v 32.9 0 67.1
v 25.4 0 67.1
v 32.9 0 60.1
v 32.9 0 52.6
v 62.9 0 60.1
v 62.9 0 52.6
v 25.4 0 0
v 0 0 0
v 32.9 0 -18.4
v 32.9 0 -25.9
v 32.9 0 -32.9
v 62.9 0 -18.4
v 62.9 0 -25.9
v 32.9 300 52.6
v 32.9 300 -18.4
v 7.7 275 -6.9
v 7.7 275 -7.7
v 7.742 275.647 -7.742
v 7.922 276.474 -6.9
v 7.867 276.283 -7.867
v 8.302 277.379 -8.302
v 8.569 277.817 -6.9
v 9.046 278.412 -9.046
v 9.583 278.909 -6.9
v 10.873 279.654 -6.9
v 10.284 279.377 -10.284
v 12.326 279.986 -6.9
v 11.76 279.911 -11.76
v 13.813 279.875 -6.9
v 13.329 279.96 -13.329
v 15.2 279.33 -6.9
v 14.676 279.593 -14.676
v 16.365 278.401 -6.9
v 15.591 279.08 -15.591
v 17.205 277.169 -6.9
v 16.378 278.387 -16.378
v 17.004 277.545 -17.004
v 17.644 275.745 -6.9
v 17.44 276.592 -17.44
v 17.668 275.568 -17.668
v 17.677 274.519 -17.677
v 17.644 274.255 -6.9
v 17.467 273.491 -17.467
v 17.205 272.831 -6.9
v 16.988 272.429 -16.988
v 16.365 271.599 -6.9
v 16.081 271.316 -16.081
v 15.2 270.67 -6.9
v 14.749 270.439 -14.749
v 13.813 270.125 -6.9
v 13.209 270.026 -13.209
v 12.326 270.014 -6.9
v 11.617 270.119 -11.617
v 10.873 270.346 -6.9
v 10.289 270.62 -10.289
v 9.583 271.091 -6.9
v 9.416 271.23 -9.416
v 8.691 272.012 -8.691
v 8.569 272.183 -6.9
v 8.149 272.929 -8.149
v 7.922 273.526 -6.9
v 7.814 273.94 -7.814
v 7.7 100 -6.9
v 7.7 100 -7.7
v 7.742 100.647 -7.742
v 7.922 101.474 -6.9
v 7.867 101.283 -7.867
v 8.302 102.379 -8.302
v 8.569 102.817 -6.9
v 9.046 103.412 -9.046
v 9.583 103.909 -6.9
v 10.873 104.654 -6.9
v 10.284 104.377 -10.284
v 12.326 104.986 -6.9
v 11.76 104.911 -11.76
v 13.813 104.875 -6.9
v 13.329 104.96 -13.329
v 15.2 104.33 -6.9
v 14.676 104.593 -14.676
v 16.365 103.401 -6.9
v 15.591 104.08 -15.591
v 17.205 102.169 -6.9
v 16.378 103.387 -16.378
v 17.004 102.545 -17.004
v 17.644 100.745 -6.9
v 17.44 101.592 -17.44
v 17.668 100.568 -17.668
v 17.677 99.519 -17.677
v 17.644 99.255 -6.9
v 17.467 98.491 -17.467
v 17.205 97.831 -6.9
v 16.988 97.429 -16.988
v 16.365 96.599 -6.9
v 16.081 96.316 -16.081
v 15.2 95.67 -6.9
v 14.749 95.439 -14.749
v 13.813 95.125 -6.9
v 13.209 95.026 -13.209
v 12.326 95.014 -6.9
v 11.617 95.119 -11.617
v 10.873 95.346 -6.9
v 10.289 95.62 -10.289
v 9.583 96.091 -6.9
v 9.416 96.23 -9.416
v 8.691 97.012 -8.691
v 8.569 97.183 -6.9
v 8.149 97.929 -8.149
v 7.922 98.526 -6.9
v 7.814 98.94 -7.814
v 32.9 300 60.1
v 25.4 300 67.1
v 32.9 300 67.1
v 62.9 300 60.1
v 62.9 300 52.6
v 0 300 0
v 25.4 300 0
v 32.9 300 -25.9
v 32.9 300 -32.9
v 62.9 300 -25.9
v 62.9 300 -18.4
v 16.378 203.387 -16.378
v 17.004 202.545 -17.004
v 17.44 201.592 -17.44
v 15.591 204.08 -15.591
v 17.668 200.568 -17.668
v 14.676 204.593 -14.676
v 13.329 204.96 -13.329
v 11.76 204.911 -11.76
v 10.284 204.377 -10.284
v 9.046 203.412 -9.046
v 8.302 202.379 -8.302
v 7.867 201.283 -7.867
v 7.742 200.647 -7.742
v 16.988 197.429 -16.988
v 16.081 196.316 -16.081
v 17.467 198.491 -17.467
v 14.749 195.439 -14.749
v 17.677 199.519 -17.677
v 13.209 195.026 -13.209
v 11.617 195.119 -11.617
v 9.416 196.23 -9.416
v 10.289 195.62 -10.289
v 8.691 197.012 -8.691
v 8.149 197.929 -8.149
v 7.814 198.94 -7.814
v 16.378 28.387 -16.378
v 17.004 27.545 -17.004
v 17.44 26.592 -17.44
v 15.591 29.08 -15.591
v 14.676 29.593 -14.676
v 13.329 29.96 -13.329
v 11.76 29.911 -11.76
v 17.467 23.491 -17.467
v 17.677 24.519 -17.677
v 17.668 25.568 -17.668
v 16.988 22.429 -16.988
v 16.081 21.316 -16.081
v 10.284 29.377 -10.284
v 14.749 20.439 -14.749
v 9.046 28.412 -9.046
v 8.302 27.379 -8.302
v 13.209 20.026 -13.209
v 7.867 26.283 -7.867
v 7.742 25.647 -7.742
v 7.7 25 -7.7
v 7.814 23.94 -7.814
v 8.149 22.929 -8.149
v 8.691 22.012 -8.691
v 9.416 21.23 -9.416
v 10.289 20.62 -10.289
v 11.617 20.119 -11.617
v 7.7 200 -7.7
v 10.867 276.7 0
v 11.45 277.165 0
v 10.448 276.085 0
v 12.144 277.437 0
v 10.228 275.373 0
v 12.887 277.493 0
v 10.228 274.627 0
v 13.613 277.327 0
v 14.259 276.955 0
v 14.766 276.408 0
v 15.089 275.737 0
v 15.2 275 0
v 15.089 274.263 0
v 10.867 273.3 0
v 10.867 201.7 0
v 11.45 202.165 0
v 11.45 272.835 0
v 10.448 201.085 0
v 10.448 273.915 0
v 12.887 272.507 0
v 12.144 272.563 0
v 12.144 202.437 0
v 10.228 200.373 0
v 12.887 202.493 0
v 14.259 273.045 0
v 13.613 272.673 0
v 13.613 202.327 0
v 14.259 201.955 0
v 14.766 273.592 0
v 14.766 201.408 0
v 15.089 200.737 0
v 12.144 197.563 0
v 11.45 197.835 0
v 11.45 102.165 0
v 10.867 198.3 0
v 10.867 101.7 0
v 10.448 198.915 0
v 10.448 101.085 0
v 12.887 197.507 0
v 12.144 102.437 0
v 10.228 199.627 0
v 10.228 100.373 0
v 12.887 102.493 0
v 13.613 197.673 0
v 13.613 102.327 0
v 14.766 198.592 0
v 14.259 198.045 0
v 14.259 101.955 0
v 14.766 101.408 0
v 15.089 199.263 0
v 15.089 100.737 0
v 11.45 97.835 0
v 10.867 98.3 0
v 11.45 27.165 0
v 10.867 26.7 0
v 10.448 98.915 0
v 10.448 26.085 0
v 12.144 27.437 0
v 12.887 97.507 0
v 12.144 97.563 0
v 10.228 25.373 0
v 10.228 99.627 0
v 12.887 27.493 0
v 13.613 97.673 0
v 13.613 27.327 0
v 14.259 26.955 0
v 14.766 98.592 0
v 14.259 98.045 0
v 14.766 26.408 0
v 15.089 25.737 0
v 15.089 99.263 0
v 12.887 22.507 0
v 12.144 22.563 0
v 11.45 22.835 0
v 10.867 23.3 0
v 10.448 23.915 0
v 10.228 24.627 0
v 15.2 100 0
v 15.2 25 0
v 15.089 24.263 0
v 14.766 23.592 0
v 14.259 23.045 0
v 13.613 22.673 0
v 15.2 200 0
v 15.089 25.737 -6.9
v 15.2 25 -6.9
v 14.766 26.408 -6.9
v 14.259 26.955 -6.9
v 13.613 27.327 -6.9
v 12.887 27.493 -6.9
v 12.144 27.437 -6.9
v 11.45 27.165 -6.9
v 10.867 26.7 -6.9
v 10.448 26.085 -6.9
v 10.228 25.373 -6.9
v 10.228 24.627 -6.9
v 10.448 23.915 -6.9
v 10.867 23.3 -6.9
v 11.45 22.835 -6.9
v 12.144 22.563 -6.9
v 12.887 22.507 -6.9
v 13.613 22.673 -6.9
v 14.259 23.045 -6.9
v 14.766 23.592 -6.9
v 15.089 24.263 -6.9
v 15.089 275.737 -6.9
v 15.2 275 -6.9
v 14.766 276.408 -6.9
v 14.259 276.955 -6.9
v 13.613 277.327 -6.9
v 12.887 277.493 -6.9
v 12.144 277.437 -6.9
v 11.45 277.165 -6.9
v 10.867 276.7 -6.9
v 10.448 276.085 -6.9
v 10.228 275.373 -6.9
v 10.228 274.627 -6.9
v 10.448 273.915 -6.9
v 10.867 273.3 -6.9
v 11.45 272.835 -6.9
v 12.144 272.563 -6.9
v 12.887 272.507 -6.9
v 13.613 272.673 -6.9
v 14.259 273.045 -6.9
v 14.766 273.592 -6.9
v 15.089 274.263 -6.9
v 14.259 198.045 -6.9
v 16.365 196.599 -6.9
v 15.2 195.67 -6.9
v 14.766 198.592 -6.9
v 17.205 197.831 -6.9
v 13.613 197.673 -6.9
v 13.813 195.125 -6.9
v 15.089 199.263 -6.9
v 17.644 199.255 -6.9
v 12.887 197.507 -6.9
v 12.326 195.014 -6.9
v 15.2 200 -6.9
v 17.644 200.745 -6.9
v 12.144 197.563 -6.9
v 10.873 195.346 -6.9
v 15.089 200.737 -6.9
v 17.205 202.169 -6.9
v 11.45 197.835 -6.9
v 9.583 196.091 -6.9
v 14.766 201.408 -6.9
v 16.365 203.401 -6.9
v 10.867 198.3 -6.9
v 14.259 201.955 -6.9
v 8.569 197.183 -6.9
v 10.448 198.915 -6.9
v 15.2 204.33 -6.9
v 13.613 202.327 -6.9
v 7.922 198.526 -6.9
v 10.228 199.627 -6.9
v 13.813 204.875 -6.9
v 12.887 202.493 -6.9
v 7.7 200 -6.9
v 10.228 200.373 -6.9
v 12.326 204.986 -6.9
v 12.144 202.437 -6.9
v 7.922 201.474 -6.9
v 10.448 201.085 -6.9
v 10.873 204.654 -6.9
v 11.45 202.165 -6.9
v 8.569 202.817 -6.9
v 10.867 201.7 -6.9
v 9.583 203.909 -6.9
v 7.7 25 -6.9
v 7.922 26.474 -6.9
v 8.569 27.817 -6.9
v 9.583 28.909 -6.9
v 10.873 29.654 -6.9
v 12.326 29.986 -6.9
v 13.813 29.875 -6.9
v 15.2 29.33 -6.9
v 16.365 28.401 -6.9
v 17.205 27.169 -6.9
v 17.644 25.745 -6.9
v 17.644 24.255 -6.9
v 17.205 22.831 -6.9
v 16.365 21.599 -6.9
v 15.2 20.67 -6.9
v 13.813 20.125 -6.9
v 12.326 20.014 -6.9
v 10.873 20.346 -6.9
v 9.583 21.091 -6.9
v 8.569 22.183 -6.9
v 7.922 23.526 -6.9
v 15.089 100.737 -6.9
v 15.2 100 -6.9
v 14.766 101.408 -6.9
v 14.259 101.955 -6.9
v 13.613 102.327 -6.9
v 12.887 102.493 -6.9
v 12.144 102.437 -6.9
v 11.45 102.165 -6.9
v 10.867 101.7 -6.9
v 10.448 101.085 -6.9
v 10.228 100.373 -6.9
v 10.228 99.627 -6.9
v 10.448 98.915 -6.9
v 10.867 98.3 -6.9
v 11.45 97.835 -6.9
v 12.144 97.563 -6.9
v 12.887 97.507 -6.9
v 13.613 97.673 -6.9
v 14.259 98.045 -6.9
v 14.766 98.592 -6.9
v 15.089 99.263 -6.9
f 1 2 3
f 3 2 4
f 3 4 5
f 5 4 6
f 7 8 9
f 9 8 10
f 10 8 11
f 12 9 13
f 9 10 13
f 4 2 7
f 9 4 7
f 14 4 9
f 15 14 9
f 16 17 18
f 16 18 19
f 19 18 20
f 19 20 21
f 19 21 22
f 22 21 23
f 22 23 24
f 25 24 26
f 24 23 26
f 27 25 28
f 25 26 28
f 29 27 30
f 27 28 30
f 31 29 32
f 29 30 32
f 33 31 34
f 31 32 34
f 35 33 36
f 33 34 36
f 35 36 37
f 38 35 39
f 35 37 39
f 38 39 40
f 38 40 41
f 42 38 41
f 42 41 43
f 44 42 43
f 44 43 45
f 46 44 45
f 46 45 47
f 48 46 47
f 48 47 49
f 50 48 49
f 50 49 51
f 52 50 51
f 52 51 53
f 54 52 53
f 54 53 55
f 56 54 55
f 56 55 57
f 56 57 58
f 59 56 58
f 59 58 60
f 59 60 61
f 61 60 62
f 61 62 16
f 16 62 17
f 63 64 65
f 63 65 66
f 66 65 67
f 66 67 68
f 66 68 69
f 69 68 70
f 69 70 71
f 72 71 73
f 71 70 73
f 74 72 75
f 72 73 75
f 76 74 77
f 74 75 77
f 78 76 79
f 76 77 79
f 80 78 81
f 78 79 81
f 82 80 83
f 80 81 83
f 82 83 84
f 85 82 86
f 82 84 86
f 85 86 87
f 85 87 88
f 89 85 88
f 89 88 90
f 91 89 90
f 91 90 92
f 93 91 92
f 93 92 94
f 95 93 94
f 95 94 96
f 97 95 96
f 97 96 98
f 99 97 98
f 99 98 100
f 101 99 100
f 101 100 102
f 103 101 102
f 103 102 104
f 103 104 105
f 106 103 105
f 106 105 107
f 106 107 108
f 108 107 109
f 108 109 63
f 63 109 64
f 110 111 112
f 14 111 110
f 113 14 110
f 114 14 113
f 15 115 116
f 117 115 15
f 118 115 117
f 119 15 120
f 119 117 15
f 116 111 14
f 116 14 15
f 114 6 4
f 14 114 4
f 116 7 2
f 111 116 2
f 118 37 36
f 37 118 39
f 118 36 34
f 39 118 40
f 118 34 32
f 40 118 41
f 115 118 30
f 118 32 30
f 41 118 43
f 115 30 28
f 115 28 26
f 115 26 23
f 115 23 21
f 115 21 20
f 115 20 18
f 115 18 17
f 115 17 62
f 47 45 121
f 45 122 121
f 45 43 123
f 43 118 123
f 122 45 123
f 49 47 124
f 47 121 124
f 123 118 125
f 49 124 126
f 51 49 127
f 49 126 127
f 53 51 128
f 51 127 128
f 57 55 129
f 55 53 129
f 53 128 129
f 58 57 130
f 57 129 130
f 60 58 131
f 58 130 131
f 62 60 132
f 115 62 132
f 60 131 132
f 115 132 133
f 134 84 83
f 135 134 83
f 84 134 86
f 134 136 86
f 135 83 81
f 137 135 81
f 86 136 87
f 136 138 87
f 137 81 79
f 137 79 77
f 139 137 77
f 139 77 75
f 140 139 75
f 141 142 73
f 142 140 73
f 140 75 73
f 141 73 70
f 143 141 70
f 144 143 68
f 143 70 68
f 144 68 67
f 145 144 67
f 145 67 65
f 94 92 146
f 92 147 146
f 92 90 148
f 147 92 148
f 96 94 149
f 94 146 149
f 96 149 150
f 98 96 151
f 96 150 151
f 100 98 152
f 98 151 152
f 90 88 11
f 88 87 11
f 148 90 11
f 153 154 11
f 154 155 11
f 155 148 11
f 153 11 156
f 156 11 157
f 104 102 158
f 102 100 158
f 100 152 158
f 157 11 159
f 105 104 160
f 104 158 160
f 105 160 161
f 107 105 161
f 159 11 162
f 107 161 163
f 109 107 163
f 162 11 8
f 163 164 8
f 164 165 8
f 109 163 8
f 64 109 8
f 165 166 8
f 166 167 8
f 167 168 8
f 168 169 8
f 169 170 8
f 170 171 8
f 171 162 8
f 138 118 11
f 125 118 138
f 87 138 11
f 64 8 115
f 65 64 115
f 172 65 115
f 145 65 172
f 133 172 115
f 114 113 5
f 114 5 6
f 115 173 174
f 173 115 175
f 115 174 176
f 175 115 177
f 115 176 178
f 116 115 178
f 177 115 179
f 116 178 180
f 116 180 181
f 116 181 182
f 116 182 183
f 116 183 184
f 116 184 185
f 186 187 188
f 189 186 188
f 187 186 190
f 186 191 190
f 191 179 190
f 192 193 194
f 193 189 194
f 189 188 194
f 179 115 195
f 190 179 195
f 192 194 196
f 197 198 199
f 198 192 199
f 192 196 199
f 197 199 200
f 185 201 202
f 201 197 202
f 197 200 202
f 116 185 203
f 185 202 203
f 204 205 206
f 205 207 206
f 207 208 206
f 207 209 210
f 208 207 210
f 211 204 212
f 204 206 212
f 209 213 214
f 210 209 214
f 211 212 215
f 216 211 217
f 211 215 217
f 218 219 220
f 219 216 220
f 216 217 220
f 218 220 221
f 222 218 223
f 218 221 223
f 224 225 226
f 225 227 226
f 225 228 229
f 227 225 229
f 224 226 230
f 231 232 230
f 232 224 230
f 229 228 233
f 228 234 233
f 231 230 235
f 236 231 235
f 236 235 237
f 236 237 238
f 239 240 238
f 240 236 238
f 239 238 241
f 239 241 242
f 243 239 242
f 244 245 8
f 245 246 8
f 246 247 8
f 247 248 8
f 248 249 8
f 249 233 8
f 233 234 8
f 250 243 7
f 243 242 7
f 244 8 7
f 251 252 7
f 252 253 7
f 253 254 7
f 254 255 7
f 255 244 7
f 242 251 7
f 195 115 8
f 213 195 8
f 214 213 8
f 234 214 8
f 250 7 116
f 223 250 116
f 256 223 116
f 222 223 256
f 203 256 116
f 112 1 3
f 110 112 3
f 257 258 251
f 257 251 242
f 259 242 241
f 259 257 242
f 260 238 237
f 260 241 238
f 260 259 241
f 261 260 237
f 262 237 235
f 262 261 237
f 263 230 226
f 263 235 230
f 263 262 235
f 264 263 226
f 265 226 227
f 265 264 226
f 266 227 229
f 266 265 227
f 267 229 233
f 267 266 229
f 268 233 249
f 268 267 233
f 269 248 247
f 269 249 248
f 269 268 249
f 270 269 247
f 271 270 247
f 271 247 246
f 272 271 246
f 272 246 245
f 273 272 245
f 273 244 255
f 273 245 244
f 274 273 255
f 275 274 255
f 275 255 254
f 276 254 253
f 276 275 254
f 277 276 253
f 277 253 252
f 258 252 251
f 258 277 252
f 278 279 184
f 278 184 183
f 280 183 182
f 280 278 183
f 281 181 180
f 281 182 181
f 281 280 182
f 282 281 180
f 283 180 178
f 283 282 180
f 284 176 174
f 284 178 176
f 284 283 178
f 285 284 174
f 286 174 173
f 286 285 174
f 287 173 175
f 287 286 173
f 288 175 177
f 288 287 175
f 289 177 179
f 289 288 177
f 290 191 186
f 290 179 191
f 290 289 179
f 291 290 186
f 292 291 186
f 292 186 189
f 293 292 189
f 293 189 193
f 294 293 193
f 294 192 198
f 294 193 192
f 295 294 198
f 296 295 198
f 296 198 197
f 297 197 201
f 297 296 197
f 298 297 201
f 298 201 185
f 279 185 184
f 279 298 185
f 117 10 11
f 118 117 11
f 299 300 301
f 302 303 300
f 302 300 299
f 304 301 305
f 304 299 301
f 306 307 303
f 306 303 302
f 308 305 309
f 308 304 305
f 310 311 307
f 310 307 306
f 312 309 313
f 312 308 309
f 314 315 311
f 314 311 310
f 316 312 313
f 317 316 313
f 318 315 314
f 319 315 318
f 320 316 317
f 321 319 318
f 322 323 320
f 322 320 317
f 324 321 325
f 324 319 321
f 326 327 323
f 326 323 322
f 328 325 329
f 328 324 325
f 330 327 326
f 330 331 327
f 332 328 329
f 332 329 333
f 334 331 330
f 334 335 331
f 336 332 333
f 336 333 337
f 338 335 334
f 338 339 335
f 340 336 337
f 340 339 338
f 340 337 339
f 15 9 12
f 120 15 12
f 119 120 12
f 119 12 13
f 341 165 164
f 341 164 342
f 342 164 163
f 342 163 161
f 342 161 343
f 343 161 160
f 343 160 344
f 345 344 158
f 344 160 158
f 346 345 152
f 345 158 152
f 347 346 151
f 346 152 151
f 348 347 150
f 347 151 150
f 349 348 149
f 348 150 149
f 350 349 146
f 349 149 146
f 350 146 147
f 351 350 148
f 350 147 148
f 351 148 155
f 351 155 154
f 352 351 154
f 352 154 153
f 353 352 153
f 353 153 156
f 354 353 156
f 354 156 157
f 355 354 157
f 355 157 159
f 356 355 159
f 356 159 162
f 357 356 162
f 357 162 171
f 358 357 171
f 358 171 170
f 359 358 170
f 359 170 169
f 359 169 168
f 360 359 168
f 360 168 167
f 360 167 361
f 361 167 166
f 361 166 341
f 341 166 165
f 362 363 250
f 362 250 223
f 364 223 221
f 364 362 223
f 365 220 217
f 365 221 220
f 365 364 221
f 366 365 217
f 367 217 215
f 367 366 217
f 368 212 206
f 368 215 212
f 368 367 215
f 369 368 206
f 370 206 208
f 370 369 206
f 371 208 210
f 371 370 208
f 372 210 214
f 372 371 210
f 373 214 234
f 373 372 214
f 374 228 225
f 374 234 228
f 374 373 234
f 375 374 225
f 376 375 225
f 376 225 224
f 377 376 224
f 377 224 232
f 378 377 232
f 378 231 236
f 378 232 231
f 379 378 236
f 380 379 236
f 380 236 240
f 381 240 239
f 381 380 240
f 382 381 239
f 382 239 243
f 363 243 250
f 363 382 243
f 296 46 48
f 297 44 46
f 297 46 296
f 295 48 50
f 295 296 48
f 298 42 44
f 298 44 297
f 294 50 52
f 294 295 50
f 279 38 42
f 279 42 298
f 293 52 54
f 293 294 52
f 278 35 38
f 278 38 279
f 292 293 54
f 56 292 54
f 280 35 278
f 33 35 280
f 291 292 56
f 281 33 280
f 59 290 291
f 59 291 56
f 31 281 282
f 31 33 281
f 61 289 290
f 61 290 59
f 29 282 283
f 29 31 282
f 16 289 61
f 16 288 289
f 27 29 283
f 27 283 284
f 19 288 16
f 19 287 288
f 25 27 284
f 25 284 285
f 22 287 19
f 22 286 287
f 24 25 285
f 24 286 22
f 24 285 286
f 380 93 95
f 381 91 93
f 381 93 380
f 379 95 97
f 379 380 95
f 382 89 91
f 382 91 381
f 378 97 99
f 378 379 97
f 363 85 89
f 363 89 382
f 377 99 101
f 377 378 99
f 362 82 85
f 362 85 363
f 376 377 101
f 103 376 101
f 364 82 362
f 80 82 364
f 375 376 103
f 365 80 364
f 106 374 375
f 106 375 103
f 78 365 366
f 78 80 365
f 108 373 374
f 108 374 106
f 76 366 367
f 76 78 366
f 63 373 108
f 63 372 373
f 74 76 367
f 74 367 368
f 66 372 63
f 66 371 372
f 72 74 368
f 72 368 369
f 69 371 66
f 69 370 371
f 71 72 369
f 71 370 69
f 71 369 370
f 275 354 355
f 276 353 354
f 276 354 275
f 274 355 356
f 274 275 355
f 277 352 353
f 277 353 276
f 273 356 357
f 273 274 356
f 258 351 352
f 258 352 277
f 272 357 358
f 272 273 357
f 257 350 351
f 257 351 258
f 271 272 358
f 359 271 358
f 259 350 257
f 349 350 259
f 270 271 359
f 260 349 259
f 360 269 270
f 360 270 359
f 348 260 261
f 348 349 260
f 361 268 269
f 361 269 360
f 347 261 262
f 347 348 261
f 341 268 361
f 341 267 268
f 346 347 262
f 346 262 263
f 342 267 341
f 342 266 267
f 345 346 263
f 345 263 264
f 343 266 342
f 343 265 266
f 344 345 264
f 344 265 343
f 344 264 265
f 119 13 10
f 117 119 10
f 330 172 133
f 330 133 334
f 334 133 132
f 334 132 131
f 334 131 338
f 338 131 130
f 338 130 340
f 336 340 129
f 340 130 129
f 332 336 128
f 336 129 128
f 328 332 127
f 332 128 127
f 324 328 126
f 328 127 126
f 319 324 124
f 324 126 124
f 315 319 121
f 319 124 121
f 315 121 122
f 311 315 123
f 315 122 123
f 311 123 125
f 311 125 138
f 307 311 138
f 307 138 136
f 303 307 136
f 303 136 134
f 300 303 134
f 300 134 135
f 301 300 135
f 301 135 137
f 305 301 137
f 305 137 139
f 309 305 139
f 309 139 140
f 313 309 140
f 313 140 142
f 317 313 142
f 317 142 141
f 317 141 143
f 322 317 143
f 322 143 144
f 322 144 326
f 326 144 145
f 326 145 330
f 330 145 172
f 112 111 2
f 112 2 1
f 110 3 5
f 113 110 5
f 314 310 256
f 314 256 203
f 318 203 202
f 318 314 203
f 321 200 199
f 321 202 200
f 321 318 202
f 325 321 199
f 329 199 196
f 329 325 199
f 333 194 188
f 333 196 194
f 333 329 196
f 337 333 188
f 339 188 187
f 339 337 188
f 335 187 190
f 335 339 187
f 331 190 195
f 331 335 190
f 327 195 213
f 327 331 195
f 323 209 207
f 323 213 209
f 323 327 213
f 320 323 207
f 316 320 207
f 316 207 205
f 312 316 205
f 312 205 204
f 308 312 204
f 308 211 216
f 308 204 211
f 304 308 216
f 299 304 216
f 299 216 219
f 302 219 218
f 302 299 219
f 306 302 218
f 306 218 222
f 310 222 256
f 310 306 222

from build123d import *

# Parameters (mm, degrees)
BOSS_EXTRUDE1_DEPTH = 300
SKETCH3_R           = 2.5
CUT_EXTRUDE1_DEPTH  = 51
SKETCH4_R           = 5
CUT_EXTRUDE2_DEPTH  = 19


with BuildPart() as part:
    # Sketch1 → Boss-Extrude1 (new body)
    with BuildSketch(Plane(origin=(0, 0, 0), x_dir=(1, 0, 0), z_dir=(0, 1, 0))):
        Polygon((0, 0), (25.4, 0), (25.4, -50.8), (25.4, -67.1), (32.9, -67.1), (32.9, -60.1), (62.9, -60.1), (62.9, -52.6), (32.9, -52.6), (32.9, 18.4), (62.9, 18.4), (62.9, 25.9), (32.9, 25.9), (32.9, 32.9), align=None)
    extrude(amount=BOSS_EXTRUDE1_DEPTH)

    # Sketch3 → Cut-Extrude1 (cut)
    with BuildSketch(Plane(origin=(-25.9, 0, -25.9), x_dir=(1, 0, 0), z_dir=(0, 0, 1))):
        with Locations((38.6, 275)):
            Circle(SKETCH3_R)
        with Locations((38.6, 200)):
            Circle(SKETCH3_R)
        with Locations((38.6, 100)):
            Circle(SKETCH3_R)
        with Locations((38.6, 25)):
            Circle(SKETCH3_R)
    extrude(amount=CUT_EXTRUDE1_DEPTH, mode=Mode.SUBTRACT)

    # Sketch4 → Cut-Extrude2 (cut)
    with BuildSketch(Plane(origin=(0, 0, -25.9), x_dir=(-1, 0, 0), z_dir=(0, 0, -1))):
        with Locations((-12.7, 275)):
            Circle(SKETCH4_R)
        with Locations((-12.7, 200)):
            Circle(SKETCH4_R)
        with Locations((-12.7, 100)):
            Circle(SKETCH4_R)
        with Locations((-12.7, 25)):
            Circle(SKETCH4_R)
    extrude(amount=-CUT_EXTRUDE2_DEPTH, mode=Mode.SUBTRACT)


solid = part.part
